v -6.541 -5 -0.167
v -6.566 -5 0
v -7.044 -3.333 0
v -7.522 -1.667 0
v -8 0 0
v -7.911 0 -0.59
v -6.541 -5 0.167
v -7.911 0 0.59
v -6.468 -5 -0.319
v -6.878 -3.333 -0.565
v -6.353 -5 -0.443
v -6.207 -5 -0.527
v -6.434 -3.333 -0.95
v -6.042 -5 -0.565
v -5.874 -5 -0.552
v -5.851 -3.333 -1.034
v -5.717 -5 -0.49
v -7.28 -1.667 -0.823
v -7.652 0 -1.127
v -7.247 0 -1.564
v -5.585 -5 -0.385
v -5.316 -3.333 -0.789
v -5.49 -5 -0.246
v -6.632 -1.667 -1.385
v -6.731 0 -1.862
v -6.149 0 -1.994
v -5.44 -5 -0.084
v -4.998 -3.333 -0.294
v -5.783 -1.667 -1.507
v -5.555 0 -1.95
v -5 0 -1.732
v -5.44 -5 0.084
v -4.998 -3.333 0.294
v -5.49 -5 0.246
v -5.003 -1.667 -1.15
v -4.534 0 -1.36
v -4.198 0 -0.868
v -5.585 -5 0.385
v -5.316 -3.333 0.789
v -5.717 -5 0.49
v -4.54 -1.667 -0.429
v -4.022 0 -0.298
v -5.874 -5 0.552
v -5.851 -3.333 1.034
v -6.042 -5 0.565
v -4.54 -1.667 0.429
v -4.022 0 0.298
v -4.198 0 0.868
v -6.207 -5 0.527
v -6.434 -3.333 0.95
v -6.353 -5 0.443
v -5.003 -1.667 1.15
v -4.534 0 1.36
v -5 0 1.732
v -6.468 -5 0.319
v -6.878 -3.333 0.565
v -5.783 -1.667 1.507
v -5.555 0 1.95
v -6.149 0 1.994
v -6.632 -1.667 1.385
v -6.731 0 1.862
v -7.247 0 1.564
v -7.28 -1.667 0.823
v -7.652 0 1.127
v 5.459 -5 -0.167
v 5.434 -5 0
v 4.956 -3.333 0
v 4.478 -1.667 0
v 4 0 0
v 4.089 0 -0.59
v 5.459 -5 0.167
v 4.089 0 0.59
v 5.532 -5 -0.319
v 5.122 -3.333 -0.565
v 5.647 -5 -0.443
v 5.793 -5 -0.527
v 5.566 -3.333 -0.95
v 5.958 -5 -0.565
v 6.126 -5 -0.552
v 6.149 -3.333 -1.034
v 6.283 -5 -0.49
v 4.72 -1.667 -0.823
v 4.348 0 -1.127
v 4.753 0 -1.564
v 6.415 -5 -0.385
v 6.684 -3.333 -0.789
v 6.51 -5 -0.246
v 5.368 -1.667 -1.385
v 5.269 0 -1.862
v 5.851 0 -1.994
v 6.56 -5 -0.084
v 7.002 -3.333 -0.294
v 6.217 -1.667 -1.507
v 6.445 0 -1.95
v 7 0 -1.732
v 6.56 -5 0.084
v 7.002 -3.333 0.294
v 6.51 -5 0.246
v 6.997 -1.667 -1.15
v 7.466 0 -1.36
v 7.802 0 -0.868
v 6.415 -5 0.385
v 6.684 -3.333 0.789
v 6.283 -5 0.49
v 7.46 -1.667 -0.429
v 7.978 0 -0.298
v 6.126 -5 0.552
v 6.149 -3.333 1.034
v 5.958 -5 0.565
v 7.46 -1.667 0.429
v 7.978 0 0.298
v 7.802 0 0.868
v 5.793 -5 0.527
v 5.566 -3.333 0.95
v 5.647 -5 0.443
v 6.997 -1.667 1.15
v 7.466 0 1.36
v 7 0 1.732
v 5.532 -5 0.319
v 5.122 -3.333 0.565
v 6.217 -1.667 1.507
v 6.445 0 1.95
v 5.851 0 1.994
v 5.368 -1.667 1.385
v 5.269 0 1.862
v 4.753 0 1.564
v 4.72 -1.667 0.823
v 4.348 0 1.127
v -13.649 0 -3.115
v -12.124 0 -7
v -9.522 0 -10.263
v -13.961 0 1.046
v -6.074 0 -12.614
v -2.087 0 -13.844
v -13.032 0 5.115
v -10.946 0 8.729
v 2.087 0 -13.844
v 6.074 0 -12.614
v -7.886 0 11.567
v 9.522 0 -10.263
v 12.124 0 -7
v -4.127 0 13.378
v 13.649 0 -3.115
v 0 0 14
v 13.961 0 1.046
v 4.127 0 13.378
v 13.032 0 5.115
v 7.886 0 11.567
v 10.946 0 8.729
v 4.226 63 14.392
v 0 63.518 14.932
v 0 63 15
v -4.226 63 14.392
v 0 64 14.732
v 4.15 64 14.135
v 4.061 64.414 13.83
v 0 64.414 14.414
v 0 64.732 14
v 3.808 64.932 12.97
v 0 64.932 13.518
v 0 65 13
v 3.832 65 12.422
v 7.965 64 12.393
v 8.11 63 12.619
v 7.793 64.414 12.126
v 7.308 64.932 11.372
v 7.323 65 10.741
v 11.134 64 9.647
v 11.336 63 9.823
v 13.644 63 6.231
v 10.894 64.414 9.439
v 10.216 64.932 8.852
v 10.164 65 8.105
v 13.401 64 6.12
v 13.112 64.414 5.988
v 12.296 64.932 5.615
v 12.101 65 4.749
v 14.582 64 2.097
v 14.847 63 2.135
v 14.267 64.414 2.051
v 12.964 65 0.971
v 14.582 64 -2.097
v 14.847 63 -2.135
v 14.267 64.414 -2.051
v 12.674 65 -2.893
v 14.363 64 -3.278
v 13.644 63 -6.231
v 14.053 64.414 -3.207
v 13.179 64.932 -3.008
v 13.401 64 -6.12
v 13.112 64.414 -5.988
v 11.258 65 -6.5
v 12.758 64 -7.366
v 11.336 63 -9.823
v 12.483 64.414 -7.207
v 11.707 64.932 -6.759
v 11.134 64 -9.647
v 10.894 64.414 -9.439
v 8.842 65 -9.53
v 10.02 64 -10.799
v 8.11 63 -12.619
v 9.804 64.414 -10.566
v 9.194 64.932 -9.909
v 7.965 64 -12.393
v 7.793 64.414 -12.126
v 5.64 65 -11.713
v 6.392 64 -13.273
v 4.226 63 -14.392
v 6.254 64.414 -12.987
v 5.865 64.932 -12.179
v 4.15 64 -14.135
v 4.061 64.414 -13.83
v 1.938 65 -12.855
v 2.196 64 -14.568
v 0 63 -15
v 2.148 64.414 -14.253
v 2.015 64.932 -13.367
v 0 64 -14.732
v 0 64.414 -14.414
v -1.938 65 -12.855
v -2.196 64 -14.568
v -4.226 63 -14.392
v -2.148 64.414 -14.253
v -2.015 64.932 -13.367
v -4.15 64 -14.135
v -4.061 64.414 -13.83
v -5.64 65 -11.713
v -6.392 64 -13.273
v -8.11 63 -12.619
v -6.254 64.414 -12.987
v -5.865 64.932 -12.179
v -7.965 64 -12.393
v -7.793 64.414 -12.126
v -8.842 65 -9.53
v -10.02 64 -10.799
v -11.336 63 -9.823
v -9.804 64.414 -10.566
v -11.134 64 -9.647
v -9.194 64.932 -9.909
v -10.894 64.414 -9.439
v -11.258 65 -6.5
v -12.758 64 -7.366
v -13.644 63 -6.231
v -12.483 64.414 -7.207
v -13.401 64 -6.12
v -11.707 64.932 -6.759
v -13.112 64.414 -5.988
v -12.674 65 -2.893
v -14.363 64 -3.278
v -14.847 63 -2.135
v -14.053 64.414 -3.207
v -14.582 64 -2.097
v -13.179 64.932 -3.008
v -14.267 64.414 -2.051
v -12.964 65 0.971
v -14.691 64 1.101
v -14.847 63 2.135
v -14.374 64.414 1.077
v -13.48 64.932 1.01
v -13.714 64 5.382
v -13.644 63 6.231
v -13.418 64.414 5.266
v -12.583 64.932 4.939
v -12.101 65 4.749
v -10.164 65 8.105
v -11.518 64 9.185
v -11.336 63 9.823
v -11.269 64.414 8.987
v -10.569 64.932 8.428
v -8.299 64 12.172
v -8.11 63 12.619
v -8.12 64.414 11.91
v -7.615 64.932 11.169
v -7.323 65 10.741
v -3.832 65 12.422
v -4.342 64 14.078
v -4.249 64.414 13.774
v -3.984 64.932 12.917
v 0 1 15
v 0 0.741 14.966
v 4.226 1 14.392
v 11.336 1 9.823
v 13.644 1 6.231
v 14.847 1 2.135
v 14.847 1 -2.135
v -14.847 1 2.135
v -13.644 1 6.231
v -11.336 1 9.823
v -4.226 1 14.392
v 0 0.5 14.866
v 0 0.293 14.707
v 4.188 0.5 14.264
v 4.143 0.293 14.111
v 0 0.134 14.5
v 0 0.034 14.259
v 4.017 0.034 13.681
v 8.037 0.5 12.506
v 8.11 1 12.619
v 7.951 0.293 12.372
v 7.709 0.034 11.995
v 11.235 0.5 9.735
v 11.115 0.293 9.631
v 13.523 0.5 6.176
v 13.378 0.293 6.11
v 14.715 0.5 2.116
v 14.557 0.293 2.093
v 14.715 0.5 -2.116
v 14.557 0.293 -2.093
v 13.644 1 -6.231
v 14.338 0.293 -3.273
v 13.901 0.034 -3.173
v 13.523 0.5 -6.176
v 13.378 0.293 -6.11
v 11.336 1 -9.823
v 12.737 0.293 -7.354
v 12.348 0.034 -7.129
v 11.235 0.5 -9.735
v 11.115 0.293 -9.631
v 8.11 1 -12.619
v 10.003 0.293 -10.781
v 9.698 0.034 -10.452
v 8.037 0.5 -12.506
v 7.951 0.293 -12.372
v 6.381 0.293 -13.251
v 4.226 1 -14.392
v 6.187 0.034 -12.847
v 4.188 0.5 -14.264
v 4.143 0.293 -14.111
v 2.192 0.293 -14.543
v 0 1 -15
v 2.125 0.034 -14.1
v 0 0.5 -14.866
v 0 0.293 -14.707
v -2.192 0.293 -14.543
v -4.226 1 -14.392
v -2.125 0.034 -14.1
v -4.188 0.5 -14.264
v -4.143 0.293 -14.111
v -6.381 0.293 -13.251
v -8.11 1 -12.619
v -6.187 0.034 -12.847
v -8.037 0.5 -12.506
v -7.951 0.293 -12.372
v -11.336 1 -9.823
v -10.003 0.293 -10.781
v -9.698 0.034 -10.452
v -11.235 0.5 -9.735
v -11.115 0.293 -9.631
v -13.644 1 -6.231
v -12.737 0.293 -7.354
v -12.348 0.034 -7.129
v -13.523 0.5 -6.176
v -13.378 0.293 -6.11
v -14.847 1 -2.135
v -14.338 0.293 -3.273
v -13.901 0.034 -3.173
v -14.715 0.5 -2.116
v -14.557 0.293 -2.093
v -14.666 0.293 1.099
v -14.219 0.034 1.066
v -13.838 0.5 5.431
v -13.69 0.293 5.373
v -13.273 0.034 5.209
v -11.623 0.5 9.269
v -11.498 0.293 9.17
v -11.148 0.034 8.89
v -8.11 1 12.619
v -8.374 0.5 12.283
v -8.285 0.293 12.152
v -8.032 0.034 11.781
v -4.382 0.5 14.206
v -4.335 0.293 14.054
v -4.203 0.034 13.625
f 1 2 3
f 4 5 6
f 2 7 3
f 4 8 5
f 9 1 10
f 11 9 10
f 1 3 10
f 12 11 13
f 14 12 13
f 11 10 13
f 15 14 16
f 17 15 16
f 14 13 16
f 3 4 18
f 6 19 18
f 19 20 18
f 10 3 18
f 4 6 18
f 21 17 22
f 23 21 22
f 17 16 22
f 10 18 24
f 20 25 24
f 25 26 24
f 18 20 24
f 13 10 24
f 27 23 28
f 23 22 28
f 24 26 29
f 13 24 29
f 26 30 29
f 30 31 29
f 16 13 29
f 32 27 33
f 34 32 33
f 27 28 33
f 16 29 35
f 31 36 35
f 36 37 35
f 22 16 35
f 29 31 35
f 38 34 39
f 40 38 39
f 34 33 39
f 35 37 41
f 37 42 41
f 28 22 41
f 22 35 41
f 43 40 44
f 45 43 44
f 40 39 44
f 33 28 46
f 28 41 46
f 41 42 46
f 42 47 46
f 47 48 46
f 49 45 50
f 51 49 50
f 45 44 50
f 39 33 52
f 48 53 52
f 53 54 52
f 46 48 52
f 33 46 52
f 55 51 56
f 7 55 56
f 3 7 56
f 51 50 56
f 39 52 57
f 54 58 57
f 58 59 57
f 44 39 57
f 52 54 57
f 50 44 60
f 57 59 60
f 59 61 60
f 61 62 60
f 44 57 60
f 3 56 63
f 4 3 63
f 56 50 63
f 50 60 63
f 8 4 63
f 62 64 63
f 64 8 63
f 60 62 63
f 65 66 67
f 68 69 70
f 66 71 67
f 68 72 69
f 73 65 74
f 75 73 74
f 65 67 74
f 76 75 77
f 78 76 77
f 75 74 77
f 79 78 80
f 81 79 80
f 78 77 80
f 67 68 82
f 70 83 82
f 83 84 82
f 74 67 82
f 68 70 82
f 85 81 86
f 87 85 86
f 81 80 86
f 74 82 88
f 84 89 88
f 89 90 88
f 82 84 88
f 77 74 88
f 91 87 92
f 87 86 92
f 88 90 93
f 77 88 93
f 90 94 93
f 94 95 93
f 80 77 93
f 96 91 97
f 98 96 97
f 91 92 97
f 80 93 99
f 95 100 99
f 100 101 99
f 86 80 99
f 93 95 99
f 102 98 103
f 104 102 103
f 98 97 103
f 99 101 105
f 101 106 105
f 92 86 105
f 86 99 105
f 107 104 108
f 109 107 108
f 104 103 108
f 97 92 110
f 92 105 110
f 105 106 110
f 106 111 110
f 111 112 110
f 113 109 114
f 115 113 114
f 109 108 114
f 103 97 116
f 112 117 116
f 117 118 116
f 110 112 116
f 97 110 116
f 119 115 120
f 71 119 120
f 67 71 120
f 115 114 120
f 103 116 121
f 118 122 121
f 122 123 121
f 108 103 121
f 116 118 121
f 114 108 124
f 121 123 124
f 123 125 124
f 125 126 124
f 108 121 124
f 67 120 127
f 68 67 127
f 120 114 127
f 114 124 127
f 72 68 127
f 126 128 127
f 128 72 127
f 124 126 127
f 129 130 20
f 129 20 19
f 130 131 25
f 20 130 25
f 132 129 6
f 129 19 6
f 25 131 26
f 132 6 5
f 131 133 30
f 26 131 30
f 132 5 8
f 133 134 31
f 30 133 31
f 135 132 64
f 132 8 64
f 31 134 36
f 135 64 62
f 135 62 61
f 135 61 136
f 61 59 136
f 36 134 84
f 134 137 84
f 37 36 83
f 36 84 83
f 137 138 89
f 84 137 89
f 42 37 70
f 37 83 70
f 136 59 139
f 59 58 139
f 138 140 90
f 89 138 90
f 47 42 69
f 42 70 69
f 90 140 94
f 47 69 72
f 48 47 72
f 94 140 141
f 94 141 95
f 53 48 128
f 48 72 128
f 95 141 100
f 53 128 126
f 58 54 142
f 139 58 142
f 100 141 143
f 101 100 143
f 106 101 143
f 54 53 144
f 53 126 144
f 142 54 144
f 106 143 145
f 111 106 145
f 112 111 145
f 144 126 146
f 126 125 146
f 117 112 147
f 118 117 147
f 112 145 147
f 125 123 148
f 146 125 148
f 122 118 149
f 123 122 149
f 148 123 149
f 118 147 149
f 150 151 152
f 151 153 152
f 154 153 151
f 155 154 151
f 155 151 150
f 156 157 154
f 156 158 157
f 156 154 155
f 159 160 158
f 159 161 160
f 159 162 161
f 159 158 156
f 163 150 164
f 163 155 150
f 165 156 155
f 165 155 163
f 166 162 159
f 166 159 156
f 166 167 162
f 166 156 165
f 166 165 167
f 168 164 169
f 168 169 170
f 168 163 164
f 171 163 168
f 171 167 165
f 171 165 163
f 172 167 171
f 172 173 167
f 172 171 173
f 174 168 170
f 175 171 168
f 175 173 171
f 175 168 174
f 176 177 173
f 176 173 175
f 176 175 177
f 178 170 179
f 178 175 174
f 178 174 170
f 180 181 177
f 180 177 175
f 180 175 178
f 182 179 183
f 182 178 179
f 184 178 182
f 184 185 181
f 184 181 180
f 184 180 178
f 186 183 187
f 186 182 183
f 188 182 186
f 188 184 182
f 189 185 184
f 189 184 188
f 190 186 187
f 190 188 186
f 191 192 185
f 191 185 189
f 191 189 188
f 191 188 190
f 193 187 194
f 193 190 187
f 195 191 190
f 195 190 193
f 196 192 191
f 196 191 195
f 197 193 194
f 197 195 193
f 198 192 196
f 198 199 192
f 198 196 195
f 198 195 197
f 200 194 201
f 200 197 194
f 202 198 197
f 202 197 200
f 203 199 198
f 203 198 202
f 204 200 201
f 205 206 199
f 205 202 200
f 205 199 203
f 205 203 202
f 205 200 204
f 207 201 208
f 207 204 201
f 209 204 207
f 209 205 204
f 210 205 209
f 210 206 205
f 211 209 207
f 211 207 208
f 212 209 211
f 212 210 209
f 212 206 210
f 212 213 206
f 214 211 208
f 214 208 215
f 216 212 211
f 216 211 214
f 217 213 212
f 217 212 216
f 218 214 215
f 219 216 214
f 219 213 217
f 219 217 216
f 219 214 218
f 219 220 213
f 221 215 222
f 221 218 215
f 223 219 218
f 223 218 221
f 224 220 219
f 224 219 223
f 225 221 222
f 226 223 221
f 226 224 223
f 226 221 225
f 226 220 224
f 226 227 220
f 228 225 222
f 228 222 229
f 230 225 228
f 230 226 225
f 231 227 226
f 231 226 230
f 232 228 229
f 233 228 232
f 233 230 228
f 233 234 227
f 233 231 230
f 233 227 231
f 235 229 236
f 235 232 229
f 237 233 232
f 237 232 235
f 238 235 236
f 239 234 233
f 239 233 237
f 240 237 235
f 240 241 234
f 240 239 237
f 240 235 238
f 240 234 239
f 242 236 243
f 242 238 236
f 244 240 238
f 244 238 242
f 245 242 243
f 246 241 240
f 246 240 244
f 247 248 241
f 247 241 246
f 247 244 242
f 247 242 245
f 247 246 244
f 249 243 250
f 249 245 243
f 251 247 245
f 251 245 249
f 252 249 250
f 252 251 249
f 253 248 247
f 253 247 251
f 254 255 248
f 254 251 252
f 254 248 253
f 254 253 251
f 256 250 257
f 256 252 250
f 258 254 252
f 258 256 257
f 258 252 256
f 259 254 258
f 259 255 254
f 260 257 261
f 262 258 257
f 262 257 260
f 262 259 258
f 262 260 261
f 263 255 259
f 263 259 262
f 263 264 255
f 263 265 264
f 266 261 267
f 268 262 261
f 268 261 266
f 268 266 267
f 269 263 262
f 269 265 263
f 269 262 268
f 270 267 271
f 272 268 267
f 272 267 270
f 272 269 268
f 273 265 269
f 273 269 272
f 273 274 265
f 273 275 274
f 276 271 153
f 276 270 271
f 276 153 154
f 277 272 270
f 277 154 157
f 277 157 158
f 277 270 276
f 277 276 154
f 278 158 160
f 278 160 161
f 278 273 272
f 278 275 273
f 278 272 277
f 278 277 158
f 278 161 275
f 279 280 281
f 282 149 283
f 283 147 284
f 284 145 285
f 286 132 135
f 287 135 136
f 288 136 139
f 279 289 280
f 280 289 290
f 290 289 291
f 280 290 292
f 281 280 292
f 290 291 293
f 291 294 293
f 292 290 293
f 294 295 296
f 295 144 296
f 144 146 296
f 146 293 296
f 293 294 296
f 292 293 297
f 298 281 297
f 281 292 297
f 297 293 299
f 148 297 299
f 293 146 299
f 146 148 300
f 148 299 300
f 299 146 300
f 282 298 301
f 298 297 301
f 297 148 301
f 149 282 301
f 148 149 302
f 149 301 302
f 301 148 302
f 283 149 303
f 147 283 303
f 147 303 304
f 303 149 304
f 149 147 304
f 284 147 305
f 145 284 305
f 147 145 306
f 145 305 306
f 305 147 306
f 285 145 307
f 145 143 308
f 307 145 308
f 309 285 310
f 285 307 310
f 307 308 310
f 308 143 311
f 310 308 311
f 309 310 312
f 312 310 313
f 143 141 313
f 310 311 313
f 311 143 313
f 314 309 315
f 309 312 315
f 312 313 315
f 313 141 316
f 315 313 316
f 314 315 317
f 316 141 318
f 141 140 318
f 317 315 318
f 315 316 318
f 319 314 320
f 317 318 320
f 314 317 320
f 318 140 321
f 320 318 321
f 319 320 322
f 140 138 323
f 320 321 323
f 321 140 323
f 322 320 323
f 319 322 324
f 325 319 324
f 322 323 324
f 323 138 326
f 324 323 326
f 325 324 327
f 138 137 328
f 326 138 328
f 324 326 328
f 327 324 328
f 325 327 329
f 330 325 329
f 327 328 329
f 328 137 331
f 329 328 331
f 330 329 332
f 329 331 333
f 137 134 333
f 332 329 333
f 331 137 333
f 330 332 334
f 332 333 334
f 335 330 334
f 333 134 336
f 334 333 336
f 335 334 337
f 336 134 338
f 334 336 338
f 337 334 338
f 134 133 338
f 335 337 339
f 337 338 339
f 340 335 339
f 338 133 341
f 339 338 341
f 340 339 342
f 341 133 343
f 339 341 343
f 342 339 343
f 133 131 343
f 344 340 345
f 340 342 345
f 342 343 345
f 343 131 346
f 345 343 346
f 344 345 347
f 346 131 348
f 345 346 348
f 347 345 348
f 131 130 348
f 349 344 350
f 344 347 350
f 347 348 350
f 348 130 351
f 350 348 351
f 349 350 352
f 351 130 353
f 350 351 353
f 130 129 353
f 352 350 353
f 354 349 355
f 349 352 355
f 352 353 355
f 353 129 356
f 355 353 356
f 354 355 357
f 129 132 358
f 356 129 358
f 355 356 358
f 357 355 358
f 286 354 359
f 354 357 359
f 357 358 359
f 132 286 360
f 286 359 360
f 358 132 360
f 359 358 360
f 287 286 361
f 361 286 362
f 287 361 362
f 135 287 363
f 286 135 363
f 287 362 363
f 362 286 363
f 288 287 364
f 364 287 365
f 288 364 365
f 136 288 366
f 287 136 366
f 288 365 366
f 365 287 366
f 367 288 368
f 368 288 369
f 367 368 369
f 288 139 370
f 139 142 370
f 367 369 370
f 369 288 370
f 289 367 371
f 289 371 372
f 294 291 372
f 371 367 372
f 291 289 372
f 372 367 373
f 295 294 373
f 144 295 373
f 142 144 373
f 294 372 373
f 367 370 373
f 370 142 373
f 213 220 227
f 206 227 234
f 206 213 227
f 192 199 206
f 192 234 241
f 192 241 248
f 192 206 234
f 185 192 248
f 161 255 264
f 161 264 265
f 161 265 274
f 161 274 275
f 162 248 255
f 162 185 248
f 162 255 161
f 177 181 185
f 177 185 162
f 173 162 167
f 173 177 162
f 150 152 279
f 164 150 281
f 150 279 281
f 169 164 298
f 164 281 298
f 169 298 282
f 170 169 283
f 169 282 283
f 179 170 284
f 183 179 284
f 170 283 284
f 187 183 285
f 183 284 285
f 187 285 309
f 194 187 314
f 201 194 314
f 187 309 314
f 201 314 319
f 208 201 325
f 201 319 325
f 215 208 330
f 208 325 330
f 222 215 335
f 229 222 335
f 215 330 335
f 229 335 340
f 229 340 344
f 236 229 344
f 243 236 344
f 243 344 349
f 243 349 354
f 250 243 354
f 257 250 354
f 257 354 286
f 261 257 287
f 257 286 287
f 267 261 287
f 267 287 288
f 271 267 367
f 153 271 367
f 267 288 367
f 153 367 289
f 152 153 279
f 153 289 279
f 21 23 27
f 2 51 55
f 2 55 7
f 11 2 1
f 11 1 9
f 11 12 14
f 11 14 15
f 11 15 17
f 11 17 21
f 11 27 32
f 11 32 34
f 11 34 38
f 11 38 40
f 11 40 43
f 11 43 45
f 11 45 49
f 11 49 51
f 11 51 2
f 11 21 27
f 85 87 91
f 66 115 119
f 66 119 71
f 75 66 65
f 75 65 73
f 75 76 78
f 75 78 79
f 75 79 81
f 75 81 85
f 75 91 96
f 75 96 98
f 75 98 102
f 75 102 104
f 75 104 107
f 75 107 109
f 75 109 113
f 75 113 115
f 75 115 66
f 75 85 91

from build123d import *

# Parameters (mm, degrees)
SKETCH1_R                     = 15
BOSS_EXTRUDE1_DEPTH           = 65
FILLET1_R                     = 2
FILLET2_R                     = 1
SKETCH2_R                     = 2
BOSS_EXTRUDE2_DEPTH           = 5
BOSS_EXTRUDE2_DRAFT           = 16
BOSS_EXTRUDE2_PROFILE_2_DEPTH = 5
BOSS_EXTRUDE2_PROFILE_2_DRAFT = 16


with BuildPart() as part:
    # Sketch1 → Boss-Extrude1 (new body)
    with BuildSketch(Plane(origin=(0, 0, 0), x_dir=(1, 0, 0), z_dir=(0, 1, 0))):
        with Locations(Location((0, 0, 0), (0, 0, 270))):
            Circle(SKETCH1_R)
    extrude(amount=BOSS_EXTRUDE1_DEPTH)

    # Fillet1
    fillet1_edges = [part.edges().sort_by_distance(p)[0] for p in [
        (0, 65, -15),
    ]]
    fillet(fillet1_edges, radius=FILLET1_R)

    # Fillet2
    fillet2_edges = [part.edges().sort_by_distance(p)[0] for p in [
        (0, 0, -15),
    ]]
    fillet(fillet2_edges, radius=FILLET2_R)


with BuildPart() as boss_extrude2_tool:
    # Sketch2 → Boss-Extrude2 (with draft: the straight prism first)
    with BuildSketch(Plane(origin=(0, 0, 0), x_dir=(-1, 0, 0), z_dir=(0, -1, 0))):
        with Locations((6, 0)):
            Circle(SKETCH2_R)
    extrude(amount=BOSS_EXTRUDE2_DEPTH)
    # Boss-Extrude2: the draft: its side faces are tilted about the plane it starts from
    boss_extrude2_sides = [boss_extrude2_tool.faces().sort_by_distance(p)[0] for p in [
        (-4, -2.5, 0),
    ]]
    draft(boss_extrude2_sides, Plane(origin=(0, 0, 0), x_dir=(-1, 0, 0), z_dir=(0, -1, 0)), BOSS_EXTRUDE2_DRAFT)


with BuildPart() as part_1:
    add(part.part)

    # Boss-Extrude2: add boss_extrude2_tool
    add(boss_extrude2_tool.part)


with BuildPart() as boss_extrude2_profile_2_tool:
    # Sketch2 → Boss-Extrude2 profile 2 (with draft: the straight prism first)
    with BuildSketch(Plane(origin=(0, 0, 0), x_dir=(-1, 0, 0), z_dir=(0, -1, 0))):
        with Locations((-6, 0)):
            Circle(SKETCH2_R)
    extrude(amount=BOSS_EXTRUDE2_PROFILE_2_DEPTH)
    # Boss-Extrude2 profile 2: the draft: its side faces are tilted about the plane it starts from
    boss_extrude2_profile_2_sides = [boss_extrude2_profile_2_tool.faces().sort_by_distance(p)[0] for p in [
        (8, -2.5, 0),
    ]]
    draft(boss_extrude2_profile_2_sides, Plane(origin=(0, 0, 0), x_dir=(-1, 0, 0), z_dir=(0, -1, 0)), BOSS_EXTRUDE2_PROFILE_2_DRAFT)


with BuildPart() as part_2:
    add(part_1.part)

    # Boss-Extrude2 profile 2: add boss_extrude2_profile_2_tool
    add(boss_extrude2_profile_2_tool.part)


solid = part_2.part
